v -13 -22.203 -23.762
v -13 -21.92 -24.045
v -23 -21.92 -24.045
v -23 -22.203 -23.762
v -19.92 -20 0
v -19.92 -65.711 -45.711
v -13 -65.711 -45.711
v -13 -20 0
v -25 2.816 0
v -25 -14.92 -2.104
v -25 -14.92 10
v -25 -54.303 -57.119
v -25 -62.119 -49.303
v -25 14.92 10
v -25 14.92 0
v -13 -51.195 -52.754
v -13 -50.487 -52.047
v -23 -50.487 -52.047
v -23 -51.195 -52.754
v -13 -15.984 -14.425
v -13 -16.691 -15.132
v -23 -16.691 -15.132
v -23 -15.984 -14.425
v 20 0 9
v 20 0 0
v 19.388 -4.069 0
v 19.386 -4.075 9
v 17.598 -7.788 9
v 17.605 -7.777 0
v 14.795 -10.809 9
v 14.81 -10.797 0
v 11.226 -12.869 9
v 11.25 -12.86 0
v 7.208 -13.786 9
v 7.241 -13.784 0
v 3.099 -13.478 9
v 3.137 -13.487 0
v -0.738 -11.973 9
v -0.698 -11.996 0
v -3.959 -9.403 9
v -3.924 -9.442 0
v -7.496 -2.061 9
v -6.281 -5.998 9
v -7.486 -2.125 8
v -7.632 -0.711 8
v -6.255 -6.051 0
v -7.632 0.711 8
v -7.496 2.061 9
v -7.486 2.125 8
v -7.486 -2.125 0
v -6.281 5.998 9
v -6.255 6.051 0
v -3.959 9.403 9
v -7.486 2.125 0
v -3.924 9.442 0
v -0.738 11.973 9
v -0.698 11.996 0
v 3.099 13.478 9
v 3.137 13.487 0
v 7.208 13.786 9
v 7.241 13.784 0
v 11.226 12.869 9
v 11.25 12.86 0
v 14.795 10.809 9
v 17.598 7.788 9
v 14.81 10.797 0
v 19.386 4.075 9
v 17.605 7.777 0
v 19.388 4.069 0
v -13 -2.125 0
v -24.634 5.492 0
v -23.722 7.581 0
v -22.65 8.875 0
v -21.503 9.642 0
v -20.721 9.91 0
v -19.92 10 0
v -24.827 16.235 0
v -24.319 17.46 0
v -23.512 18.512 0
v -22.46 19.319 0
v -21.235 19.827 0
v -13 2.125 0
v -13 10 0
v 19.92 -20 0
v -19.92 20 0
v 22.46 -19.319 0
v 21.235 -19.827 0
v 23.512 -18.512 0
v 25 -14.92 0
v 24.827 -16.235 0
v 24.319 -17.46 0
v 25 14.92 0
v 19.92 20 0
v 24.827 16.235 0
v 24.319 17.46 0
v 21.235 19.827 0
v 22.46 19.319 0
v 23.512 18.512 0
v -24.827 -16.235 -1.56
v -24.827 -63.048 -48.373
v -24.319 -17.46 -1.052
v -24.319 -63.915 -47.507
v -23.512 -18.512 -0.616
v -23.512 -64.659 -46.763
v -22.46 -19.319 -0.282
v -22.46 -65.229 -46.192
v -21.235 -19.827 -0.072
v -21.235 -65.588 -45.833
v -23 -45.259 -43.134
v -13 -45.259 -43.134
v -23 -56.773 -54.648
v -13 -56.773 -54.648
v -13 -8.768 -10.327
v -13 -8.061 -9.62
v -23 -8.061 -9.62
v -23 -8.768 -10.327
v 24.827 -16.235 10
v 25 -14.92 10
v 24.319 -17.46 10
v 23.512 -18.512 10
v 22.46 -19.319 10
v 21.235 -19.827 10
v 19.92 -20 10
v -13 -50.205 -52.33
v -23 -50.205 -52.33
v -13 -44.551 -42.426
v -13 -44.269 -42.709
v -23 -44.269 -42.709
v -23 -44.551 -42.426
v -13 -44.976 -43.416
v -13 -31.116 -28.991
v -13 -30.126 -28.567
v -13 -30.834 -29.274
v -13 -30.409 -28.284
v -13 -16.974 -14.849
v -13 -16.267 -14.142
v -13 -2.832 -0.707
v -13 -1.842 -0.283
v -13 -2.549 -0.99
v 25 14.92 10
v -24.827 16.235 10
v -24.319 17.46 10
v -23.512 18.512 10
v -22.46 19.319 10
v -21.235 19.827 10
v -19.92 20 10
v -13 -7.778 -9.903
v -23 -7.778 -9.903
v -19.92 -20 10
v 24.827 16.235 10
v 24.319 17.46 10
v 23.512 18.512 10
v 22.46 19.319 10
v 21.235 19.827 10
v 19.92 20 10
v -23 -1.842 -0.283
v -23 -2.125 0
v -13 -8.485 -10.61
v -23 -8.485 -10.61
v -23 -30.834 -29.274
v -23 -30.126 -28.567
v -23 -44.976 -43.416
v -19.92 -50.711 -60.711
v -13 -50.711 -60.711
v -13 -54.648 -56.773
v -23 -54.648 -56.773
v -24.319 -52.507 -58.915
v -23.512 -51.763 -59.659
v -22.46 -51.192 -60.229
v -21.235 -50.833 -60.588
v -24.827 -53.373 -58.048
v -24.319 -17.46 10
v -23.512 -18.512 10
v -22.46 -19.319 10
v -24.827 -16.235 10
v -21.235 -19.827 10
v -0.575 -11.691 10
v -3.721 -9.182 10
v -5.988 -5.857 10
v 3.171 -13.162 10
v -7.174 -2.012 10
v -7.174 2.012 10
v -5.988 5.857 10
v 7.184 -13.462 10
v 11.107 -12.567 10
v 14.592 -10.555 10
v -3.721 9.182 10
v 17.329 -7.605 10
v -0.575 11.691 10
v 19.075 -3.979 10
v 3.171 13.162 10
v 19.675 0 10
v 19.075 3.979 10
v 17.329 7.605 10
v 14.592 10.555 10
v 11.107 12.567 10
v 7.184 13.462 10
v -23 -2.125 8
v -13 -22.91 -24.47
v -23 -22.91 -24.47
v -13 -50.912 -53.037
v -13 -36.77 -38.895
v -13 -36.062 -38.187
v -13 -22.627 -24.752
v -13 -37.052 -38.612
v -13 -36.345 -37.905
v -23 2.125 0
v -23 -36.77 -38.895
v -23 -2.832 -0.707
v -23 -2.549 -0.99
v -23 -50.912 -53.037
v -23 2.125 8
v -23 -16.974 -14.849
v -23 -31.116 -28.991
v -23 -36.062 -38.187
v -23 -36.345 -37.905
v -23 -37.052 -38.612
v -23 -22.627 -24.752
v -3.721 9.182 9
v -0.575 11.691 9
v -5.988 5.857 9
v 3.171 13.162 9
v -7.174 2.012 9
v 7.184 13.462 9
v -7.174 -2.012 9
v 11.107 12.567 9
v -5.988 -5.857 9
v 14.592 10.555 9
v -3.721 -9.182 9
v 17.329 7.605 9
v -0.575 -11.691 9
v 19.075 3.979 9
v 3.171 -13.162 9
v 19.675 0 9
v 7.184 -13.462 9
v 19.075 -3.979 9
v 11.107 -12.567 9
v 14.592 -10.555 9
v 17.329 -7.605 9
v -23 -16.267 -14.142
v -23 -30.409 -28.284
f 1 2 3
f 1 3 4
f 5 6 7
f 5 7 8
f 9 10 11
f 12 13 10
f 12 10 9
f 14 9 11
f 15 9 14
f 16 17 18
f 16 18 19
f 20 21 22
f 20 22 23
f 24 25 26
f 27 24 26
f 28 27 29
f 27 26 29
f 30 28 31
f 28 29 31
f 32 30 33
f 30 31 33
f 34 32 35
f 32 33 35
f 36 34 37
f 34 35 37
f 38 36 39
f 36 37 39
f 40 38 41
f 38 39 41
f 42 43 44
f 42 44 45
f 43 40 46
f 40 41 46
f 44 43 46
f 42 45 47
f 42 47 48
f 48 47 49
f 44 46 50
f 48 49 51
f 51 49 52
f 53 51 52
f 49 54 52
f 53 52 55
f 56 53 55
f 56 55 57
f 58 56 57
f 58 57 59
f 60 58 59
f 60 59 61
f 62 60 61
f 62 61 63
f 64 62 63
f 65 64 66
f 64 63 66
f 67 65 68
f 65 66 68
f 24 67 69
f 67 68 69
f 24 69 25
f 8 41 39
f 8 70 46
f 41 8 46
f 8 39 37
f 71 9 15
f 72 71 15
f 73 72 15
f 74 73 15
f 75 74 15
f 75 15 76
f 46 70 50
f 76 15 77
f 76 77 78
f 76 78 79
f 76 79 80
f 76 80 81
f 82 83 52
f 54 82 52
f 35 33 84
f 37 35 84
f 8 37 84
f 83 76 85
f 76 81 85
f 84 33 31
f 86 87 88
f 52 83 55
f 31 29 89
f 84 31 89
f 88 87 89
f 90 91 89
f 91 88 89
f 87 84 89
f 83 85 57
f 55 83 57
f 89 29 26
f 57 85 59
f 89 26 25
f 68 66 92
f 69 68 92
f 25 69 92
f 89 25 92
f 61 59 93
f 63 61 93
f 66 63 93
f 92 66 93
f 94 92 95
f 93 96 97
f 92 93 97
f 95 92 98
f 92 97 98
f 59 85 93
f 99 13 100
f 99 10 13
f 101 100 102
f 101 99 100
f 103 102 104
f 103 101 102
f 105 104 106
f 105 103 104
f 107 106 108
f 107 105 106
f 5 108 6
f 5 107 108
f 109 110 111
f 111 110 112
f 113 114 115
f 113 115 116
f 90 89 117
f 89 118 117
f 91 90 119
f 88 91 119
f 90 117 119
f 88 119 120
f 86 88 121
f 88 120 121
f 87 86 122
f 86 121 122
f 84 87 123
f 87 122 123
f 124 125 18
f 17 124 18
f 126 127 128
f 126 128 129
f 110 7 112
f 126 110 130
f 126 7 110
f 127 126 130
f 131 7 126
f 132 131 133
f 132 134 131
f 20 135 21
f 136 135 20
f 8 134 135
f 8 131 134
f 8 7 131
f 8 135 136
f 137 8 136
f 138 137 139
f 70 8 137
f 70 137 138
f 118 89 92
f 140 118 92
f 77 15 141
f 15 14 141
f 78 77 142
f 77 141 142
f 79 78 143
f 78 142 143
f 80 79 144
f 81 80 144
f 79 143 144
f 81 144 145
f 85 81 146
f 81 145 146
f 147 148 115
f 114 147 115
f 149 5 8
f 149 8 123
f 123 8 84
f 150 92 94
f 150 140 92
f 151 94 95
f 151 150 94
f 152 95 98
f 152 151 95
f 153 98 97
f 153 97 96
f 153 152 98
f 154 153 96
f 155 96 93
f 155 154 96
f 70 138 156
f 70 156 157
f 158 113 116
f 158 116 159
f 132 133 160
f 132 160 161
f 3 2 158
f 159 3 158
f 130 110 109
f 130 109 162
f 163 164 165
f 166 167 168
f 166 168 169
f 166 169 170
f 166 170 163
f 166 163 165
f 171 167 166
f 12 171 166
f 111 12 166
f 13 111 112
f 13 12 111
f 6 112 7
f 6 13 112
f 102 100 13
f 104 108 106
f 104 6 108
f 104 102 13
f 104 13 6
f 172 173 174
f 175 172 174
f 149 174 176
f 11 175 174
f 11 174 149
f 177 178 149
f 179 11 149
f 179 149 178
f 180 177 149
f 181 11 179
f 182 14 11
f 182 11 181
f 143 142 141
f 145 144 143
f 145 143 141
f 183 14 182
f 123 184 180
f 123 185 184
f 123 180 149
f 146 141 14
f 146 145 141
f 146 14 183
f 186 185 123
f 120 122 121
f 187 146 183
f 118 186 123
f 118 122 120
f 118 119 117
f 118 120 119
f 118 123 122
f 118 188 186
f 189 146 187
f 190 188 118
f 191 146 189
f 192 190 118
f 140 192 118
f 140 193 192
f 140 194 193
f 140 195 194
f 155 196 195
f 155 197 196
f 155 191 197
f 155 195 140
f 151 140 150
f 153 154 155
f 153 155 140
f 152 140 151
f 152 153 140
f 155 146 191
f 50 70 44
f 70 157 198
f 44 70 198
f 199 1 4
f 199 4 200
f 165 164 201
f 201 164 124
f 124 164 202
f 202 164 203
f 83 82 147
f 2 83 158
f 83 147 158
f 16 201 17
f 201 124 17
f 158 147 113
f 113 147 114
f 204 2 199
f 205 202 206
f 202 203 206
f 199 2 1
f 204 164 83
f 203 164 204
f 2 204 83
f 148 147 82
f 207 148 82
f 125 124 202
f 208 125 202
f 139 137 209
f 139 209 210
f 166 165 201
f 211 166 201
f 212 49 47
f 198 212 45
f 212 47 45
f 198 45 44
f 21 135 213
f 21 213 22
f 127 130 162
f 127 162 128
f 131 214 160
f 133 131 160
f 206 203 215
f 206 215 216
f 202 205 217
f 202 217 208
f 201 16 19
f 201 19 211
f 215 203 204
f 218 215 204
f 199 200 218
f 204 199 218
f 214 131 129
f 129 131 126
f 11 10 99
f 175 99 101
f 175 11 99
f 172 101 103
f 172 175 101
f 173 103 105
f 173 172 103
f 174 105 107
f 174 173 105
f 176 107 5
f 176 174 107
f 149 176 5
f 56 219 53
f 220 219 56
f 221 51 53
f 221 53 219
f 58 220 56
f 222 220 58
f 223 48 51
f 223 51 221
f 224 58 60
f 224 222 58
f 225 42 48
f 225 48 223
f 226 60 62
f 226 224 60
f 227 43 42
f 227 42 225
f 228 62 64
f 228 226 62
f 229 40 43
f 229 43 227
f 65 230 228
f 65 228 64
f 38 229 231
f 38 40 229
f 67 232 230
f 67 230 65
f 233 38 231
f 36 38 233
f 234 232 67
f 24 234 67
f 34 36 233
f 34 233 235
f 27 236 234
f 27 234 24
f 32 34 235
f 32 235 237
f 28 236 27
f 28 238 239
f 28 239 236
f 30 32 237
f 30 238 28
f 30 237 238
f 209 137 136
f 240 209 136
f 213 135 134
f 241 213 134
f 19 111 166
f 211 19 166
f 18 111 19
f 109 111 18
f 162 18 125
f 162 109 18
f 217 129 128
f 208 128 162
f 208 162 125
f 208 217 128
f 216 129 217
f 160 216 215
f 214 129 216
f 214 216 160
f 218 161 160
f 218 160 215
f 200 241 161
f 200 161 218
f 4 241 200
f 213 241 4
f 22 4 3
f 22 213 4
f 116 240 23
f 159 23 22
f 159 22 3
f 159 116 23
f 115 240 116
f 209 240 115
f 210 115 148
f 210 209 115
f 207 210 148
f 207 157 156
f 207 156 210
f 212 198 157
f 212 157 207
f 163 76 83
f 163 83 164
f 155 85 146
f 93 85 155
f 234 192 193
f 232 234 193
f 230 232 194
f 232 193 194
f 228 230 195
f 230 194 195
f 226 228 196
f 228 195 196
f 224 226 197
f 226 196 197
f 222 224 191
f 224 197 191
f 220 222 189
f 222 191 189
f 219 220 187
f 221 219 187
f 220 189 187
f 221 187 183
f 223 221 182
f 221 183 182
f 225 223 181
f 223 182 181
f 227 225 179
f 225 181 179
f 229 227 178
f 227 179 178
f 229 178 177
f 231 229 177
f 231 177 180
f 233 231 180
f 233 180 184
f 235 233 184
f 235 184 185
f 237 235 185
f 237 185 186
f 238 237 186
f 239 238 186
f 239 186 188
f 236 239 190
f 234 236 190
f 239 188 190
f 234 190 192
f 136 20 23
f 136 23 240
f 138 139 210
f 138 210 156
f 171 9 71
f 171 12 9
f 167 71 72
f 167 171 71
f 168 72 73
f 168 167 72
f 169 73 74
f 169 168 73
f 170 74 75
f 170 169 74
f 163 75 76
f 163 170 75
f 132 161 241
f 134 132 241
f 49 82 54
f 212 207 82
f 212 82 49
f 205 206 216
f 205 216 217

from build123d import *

# Parameters (mm, degrees)
F0_W      = 50
F0_H      = 40
F1_DEPTH  = 10
F2_R      = 13.825
F3_DEPTH  = 9
F4_R      = 13.5
F5_DEPTH  = 1
F6_W      = 4.25
F6_H      = 8
F7_DEPTH  = 17.515289916
F9_DEPTH  = 12
F10_R     = 5.08
F11_R     = 5.08
F13_DEPTH = 10
F15_DEPTH = 10
F17_DEPTH = 10


with BuildPart() as f1:
    # F0 (on Top) → F1 (new body)
    with BuildSketch(Plane.XY):
        Rectangle(F0_W, F0_H)
    extrude(amount=F1_DEPTH)

    # F2 (on face) → F3 (cut)
    with BuildSketch(Plane(origin=(0, 0, 0), x_dir=(1, 0, 0), z_dir=(0, 0, -1))):
        with Locations((6.175, 0)):
            Circle(F2_R)
    extrude(amount=-F3_DEPTH, mode=Mode.SUBTRACT)

    # F4 (on face) → F5 (cut, through all)
    with BuildSketch(Plane.XY.offset(10)):
        with Locations((6.175, 0)):
            Circle(F4_R)
    extrude(amount=-F5_DEPTH, mode=Mode.SUBTRACT)

    # F6 (on face) → F7 (cut, through all)
    with BuildSketch(Plane(origin=(-25, 0, 0), x_dir=(0, -1, 0), z_dir=(-1, 0, 0))):
        with Locations((0, 4)):
            Rectangle(F6_W, F6_H)
    extrude(amount=-F7_DEPTH, mode=Mode.SUBTRACT)

    # F8 (on face) → F9 (join)
    with BuildSketch(Plane(origin=(-25, 0, 0), x_dir=(0, -1, 0), z_dir=(-1, 0, 0))):
        Polygon((10, 10), (-20, 10), (50.7106781187, -60.7106781187), (65.7106781187, -45.7106781187), align=None)
    extrude(amount=-F9_DEPTH)

    # F10
    f10_edges = [f1.edges().sort_by_distance(p)[0] for p in [
        (25, -20, 5),
        (-25, -20, 5),
        (-25, 20, 5),
        (25, 20, 5),
    ]]
    fillet(f10_edges, radius=F10_R)

    # F11
    f11_edges = [f1.edges().sort_by_distance(p)[0] for p in [
        (-25, -42.855339, -22.855339),
        (-25, -20.355339, -30.355339),
    ]]
    fillet(f11_edges, radius=F11_R)

    # F12 (on face) → F13 (cut)
    with BuildSketch(Plane.YZ.offset(-13)):
        Polygon((2.125, 8), (-2.125, 8), (-2.125, 0), (-56.7731781187, -54.6481781187), (-54.6481781187, -56.7731781187), (2.125, 0), align=None)
    extrude(amount=-F13_DEPTH, mode=Mode.SUBTRACT)

    # F14 (on face) → F15 (join, through all)
    with BuildSketch(Plane.YZ.offset(-13)):
        Polygon((-1.8421572875, -0.2828427125), (-2.125, 0), (-2.8321067812, -0.7071067812), (-2.5492640687, -0.9899494937), align=None)
        Polygon((-16.2671356237, -14.1421356237), (-16.9742424049, -14.8492424049), (-16.6913996924, -15.1320851174), (-15.9842929113, -14.4249783362), align=None)
        Polygon((-30.4092712475, -28.2842712475), (-31.1163780286, -28.9913780286), (-30.8335353162, -29.2742207411), (-30.126428535, -28.5671139599), align=None)
        Polygon((-44.5514068712, -42.4264068712), (-45.2585136524, -43.1335136524), (-44.9756709399, -43.4163563649), (-44.2685641587, -42.7092495837), align=None)
    extrude(amount=-F15_DEPTH)

    # F16 (on face) → F17 (join, through all)
    with BuildSketch(Plane.YZ.offset(-13)):
        Polygon((-8.4852813742, -10.6102813742), (-7.7781745931, -9.9031745931), (-8.0610173055, -9.6203318806), (-8.7681240867, -10.3274386618), align=None)
        Polygon((-22.9102597104, -24.4695742855), (-22.627416998, -24.752416998), (-21.9203102168, -24.0453102168), (-22.2031529293, -23.7624675043), align=None)
        Polygon((-37.0523953342, -38.6117099092), (-36.7695526217, -38.8945526217), (-36.0624458405, -38.1874458405), (-36.345288553, -37.904603128), align=None)
        Polygon((-51.1945309579, -52.753845533), (-50.9116882454, -53.0366882454), (-50.2045814642, -52.3295814642), (-50.4874241767, -52.0467387518), align=None)
    extrude(amount=-F17_DEPTH)


solid = f1.part
